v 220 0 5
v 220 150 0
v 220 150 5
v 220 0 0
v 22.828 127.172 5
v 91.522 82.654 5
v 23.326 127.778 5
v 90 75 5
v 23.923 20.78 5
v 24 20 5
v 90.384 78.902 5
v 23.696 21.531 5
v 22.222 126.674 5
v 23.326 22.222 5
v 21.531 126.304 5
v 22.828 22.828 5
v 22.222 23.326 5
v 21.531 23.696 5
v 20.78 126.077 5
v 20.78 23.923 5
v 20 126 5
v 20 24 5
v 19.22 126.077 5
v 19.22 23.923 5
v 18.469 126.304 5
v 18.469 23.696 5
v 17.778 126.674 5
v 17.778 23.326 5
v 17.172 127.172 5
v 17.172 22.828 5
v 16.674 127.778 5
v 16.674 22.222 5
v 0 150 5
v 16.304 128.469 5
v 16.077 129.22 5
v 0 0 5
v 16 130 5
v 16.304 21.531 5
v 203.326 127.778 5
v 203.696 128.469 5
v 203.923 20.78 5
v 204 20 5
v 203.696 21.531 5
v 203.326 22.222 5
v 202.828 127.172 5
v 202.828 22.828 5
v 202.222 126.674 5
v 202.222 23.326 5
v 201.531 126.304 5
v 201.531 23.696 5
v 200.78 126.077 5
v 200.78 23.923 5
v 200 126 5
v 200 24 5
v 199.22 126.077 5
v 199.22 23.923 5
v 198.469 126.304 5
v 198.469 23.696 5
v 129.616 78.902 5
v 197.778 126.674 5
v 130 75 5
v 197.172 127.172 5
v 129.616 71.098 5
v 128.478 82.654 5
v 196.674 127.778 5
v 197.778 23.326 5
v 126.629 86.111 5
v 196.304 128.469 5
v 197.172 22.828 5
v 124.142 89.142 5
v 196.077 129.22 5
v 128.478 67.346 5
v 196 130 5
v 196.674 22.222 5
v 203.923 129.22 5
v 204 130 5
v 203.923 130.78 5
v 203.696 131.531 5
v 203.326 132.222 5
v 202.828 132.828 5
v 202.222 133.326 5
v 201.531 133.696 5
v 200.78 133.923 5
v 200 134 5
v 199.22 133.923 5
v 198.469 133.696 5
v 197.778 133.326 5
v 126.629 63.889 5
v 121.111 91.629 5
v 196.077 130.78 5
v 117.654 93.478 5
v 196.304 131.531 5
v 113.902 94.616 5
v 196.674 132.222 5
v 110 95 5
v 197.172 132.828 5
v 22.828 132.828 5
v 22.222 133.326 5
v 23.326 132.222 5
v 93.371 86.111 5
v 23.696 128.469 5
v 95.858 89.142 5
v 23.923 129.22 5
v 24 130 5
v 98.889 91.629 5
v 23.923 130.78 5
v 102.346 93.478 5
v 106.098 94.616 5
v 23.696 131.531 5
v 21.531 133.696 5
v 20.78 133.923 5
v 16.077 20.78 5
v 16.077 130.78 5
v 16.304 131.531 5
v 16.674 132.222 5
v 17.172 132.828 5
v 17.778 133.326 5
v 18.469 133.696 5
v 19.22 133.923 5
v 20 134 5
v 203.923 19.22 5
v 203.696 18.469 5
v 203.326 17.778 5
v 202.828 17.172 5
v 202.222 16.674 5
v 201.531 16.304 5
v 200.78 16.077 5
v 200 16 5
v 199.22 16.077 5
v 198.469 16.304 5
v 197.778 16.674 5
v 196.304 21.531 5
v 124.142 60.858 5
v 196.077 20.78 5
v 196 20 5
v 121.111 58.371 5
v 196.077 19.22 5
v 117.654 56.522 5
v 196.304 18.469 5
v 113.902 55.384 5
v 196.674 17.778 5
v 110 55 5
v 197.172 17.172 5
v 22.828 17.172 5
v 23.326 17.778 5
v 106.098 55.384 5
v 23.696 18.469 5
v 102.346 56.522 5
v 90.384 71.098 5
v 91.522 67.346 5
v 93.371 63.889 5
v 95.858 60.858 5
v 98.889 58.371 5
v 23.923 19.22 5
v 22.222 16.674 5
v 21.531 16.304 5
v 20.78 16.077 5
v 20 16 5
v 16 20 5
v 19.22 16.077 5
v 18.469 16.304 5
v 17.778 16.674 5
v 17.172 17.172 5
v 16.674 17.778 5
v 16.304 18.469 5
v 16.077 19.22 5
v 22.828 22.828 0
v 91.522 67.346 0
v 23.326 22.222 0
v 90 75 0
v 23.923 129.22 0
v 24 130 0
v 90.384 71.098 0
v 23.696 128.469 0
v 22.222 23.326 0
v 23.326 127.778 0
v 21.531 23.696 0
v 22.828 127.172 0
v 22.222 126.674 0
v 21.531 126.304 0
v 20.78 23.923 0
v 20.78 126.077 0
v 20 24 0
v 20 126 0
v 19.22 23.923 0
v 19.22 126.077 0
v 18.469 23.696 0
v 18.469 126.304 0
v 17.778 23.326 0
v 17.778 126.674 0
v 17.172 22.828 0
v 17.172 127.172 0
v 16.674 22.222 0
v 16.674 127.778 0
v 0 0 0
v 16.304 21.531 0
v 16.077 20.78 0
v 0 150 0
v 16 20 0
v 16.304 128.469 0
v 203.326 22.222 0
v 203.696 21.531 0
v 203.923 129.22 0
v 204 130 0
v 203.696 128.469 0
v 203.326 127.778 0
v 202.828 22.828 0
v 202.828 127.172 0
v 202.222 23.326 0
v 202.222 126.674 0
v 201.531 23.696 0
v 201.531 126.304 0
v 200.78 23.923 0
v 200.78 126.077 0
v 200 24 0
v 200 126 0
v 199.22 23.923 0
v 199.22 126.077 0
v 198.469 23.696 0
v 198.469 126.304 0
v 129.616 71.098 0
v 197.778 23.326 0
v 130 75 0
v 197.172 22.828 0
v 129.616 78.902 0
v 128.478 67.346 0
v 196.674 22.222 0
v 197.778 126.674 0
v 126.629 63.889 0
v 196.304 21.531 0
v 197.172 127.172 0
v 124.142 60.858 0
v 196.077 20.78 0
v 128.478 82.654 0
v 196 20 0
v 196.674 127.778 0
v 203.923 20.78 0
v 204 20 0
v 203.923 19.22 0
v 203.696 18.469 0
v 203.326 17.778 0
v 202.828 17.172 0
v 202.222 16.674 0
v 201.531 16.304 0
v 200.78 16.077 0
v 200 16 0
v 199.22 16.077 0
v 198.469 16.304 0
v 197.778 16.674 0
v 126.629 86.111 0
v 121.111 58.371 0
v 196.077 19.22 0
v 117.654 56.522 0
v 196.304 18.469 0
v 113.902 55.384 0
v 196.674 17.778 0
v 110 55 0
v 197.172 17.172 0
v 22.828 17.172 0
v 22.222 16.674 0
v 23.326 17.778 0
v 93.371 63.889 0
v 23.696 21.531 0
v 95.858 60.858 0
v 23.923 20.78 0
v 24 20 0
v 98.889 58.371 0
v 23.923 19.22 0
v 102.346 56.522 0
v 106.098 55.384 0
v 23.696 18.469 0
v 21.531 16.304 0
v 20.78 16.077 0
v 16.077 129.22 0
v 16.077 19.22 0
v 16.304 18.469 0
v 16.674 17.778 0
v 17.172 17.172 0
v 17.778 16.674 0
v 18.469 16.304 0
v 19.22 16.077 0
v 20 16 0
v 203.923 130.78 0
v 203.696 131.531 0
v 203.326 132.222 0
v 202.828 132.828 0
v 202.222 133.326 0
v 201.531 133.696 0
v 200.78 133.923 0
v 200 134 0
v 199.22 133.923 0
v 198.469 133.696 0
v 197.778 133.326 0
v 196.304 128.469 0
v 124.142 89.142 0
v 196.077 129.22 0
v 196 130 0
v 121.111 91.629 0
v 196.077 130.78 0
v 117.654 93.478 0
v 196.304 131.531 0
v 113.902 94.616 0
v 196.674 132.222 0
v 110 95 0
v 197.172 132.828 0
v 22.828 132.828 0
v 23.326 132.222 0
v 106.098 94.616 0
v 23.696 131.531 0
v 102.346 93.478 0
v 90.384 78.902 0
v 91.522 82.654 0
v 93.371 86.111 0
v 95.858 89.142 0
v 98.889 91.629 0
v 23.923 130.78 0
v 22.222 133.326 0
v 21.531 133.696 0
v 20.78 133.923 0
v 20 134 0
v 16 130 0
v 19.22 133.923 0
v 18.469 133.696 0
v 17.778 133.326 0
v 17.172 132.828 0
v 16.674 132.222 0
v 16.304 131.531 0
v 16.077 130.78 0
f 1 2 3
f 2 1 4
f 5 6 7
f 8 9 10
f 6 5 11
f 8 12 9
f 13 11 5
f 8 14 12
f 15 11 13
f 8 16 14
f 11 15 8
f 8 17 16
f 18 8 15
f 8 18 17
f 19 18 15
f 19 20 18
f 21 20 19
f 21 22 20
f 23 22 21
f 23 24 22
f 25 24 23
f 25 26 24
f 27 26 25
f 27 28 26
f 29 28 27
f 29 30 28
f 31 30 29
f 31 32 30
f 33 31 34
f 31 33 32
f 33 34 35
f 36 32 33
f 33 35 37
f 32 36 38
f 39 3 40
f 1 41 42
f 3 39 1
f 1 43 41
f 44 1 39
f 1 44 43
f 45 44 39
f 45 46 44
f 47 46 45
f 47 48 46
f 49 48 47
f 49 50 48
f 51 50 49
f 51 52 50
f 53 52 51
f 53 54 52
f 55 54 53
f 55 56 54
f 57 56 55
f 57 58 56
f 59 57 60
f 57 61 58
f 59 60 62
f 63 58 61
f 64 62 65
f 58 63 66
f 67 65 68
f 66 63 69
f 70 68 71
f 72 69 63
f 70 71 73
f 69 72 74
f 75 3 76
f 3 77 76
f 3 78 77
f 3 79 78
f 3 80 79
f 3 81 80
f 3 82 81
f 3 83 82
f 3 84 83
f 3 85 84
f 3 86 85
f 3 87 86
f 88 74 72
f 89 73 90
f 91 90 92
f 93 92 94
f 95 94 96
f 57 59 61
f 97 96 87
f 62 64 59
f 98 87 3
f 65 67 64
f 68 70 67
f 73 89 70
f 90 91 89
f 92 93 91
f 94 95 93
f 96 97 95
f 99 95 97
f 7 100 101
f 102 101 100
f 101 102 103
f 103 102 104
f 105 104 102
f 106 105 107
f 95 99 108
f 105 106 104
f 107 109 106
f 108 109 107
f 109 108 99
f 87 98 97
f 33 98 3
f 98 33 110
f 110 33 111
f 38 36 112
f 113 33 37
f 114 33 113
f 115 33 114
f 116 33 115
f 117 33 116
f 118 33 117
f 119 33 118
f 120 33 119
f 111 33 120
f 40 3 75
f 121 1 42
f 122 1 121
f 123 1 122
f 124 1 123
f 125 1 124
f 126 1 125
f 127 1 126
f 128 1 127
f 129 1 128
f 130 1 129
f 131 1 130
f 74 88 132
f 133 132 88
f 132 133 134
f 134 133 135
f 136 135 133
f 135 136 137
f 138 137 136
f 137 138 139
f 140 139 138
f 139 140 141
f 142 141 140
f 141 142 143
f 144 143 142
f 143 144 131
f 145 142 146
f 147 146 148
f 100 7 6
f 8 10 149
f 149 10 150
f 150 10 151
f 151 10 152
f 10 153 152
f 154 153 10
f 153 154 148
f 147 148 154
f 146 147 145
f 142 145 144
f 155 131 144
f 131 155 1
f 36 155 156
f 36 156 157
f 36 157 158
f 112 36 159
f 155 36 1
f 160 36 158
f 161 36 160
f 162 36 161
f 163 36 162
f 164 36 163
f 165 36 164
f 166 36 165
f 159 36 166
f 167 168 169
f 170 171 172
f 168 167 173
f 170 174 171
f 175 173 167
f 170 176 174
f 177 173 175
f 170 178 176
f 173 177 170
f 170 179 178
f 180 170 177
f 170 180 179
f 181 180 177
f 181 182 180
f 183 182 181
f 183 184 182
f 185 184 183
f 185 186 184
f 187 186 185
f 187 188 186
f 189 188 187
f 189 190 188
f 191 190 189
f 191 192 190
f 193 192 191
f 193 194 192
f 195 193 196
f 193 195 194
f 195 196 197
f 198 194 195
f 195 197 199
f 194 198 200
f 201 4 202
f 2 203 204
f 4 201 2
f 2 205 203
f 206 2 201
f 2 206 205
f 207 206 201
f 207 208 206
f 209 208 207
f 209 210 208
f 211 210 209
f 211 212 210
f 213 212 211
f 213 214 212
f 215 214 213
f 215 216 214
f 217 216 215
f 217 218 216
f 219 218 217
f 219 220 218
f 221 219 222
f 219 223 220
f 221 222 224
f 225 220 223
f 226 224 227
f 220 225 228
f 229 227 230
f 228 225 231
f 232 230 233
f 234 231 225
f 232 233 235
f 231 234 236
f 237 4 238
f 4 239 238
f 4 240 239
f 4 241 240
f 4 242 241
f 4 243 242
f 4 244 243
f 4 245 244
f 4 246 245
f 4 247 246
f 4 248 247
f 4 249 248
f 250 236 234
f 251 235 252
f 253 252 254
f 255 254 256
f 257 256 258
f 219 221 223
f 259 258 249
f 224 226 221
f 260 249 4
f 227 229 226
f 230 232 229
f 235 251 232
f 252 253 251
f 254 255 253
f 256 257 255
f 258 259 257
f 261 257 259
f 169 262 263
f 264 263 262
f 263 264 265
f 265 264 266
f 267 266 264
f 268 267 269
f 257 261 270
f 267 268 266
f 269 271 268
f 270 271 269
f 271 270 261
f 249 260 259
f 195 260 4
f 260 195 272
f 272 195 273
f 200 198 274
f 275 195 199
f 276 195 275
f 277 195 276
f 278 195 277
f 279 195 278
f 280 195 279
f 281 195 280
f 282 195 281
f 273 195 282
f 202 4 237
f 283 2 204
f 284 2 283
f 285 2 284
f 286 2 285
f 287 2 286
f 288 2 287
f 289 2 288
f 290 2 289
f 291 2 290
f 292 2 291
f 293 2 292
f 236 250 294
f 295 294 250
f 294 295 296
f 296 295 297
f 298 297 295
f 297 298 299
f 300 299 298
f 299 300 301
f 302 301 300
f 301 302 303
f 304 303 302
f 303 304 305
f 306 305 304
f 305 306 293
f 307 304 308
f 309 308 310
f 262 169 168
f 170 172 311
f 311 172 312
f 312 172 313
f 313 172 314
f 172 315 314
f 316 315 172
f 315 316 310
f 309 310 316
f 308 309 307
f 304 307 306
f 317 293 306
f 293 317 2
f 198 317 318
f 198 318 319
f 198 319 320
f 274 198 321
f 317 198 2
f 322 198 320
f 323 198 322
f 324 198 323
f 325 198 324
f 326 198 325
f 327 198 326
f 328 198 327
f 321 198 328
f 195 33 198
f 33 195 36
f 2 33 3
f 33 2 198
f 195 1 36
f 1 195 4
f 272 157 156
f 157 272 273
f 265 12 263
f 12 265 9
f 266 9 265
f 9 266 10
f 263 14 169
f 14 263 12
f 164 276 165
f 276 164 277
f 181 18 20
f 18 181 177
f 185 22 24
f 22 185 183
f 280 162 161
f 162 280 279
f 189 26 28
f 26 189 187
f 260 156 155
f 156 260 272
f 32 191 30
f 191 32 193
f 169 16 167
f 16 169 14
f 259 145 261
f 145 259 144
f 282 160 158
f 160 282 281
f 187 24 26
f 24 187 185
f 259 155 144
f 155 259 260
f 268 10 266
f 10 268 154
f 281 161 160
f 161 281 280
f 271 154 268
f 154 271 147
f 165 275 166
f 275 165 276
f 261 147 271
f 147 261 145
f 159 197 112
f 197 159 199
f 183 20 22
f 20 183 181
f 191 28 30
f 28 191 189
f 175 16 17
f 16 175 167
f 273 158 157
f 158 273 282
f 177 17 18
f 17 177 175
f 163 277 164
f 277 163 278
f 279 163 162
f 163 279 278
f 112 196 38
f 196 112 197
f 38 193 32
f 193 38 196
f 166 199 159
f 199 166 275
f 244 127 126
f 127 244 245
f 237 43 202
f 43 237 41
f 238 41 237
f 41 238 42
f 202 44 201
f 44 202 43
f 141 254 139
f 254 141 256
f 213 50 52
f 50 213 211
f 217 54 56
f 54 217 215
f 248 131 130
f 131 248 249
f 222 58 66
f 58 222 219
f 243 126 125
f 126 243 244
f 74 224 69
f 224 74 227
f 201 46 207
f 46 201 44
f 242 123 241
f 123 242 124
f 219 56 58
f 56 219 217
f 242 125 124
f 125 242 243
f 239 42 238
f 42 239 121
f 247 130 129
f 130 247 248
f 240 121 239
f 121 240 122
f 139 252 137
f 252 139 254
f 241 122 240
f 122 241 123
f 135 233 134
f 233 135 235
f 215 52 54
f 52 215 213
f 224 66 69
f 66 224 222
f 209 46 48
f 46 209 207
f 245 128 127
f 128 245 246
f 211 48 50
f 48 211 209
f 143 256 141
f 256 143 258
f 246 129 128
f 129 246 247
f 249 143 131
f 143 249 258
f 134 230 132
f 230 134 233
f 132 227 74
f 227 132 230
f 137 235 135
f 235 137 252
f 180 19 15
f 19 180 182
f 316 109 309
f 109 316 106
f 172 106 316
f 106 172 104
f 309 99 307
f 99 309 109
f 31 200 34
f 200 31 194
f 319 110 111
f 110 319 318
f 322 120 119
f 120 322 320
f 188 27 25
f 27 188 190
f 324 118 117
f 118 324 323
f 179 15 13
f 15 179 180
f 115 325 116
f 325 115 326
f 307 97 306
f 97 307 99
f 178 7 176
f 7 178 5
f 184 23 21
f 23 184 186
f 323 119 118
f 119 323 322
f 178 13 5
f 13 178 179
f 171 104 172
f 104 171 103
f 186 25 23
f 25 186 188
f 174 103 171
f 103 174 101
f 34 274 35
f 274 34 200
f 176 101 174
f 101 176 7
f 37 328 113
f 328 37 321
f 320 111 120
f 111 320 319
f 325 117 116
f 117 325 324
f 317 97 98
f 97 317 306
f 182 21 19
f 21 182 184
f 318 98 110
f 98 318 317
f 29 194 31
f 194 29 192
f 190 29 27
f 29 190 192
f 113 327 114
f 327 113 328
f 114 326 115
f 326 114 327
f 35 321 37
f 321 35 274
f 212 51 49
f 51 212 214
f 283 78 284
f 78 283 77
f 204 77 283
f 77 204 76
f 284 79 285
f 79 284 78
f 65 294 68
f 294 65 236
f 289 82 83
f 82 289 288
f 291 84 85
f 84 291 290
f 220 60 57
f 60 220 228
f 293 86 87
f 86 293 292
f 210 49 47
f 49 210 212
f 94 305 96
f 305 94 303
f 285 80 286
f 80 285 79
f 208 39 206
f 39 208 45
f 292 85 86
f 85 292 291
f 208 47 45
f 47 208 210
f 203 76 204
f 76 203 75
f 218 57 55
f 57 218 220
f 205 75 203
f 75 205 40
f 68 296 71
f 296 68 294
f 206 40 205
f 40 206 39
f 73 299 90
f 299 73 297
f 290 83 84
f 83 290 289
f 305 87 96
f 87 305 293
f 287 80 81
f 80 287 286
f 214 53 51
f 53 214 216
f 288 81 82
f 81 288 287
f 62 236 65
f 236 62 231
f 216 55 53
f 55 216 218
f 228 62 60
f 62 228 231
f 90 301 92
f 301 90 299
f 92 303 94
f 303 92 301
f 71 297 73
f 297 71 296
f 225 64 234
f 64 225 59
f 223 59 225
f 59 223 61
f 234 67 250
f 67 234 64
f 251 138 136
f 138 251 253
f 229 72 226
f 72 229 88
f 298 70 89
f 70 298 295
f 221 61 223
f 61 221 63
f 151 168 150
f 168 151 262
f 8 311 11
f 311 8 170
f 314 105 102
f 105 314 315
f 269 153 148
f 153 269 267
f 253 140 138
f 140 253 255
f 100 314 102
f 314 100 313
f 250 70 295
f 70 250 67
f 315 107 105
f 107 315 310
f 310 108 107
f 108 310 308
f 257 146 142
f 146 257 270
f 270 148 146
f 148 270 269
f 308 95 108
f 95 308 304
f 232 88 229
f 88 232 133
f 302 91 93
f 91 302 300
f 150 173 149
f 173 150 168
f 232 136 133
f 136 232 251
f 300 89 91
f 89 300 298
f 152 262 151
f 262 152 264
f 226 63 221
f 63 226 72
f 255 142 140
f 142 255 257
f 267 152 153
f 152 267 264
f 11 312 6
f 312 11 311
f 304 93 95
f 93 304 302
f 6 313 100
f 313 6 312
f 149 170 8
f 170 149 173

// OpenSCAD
$fn = 32;

// ----------------------------------------------------------------------
// Big plate: 200-250 mm adapter plate
// ----------------------------------------------------------------------

// --- parameters (mm) ---
plate_l = 220;            // plate length, X
plate_w = 150;            // plate width, Y
plate_t = 5;              // plate thickness, Z
corner_d = 8;             // corner hole diameter
corner_in = 20;           // corner hole inset from the edges
bore_d = 40;              // central bore

difference() {
  cube([plate_l, plate_w, plate_t]);
  translate([corner_in, corner_in, -1]) cylinder(h = plate_t + 2, d = corner_d);
  translate([plate_l - corner_in, corner_in, -1]) cylinder(h = plate_t + 2, d = corner_d);
  translate([corner_in, plate_w - corner_in, -1]) cylinder(h = plate_t + 2, d = corner_d);
  translate([plate_l - corner_in, plate_w - corner_in, -1]) cylinder(h = plate_t + 2, d = corner_d);
  translate([plate_l / 2, plate_w / 2, -1]) cylinder(h = plate_t + 2, d = bore_d);
}
